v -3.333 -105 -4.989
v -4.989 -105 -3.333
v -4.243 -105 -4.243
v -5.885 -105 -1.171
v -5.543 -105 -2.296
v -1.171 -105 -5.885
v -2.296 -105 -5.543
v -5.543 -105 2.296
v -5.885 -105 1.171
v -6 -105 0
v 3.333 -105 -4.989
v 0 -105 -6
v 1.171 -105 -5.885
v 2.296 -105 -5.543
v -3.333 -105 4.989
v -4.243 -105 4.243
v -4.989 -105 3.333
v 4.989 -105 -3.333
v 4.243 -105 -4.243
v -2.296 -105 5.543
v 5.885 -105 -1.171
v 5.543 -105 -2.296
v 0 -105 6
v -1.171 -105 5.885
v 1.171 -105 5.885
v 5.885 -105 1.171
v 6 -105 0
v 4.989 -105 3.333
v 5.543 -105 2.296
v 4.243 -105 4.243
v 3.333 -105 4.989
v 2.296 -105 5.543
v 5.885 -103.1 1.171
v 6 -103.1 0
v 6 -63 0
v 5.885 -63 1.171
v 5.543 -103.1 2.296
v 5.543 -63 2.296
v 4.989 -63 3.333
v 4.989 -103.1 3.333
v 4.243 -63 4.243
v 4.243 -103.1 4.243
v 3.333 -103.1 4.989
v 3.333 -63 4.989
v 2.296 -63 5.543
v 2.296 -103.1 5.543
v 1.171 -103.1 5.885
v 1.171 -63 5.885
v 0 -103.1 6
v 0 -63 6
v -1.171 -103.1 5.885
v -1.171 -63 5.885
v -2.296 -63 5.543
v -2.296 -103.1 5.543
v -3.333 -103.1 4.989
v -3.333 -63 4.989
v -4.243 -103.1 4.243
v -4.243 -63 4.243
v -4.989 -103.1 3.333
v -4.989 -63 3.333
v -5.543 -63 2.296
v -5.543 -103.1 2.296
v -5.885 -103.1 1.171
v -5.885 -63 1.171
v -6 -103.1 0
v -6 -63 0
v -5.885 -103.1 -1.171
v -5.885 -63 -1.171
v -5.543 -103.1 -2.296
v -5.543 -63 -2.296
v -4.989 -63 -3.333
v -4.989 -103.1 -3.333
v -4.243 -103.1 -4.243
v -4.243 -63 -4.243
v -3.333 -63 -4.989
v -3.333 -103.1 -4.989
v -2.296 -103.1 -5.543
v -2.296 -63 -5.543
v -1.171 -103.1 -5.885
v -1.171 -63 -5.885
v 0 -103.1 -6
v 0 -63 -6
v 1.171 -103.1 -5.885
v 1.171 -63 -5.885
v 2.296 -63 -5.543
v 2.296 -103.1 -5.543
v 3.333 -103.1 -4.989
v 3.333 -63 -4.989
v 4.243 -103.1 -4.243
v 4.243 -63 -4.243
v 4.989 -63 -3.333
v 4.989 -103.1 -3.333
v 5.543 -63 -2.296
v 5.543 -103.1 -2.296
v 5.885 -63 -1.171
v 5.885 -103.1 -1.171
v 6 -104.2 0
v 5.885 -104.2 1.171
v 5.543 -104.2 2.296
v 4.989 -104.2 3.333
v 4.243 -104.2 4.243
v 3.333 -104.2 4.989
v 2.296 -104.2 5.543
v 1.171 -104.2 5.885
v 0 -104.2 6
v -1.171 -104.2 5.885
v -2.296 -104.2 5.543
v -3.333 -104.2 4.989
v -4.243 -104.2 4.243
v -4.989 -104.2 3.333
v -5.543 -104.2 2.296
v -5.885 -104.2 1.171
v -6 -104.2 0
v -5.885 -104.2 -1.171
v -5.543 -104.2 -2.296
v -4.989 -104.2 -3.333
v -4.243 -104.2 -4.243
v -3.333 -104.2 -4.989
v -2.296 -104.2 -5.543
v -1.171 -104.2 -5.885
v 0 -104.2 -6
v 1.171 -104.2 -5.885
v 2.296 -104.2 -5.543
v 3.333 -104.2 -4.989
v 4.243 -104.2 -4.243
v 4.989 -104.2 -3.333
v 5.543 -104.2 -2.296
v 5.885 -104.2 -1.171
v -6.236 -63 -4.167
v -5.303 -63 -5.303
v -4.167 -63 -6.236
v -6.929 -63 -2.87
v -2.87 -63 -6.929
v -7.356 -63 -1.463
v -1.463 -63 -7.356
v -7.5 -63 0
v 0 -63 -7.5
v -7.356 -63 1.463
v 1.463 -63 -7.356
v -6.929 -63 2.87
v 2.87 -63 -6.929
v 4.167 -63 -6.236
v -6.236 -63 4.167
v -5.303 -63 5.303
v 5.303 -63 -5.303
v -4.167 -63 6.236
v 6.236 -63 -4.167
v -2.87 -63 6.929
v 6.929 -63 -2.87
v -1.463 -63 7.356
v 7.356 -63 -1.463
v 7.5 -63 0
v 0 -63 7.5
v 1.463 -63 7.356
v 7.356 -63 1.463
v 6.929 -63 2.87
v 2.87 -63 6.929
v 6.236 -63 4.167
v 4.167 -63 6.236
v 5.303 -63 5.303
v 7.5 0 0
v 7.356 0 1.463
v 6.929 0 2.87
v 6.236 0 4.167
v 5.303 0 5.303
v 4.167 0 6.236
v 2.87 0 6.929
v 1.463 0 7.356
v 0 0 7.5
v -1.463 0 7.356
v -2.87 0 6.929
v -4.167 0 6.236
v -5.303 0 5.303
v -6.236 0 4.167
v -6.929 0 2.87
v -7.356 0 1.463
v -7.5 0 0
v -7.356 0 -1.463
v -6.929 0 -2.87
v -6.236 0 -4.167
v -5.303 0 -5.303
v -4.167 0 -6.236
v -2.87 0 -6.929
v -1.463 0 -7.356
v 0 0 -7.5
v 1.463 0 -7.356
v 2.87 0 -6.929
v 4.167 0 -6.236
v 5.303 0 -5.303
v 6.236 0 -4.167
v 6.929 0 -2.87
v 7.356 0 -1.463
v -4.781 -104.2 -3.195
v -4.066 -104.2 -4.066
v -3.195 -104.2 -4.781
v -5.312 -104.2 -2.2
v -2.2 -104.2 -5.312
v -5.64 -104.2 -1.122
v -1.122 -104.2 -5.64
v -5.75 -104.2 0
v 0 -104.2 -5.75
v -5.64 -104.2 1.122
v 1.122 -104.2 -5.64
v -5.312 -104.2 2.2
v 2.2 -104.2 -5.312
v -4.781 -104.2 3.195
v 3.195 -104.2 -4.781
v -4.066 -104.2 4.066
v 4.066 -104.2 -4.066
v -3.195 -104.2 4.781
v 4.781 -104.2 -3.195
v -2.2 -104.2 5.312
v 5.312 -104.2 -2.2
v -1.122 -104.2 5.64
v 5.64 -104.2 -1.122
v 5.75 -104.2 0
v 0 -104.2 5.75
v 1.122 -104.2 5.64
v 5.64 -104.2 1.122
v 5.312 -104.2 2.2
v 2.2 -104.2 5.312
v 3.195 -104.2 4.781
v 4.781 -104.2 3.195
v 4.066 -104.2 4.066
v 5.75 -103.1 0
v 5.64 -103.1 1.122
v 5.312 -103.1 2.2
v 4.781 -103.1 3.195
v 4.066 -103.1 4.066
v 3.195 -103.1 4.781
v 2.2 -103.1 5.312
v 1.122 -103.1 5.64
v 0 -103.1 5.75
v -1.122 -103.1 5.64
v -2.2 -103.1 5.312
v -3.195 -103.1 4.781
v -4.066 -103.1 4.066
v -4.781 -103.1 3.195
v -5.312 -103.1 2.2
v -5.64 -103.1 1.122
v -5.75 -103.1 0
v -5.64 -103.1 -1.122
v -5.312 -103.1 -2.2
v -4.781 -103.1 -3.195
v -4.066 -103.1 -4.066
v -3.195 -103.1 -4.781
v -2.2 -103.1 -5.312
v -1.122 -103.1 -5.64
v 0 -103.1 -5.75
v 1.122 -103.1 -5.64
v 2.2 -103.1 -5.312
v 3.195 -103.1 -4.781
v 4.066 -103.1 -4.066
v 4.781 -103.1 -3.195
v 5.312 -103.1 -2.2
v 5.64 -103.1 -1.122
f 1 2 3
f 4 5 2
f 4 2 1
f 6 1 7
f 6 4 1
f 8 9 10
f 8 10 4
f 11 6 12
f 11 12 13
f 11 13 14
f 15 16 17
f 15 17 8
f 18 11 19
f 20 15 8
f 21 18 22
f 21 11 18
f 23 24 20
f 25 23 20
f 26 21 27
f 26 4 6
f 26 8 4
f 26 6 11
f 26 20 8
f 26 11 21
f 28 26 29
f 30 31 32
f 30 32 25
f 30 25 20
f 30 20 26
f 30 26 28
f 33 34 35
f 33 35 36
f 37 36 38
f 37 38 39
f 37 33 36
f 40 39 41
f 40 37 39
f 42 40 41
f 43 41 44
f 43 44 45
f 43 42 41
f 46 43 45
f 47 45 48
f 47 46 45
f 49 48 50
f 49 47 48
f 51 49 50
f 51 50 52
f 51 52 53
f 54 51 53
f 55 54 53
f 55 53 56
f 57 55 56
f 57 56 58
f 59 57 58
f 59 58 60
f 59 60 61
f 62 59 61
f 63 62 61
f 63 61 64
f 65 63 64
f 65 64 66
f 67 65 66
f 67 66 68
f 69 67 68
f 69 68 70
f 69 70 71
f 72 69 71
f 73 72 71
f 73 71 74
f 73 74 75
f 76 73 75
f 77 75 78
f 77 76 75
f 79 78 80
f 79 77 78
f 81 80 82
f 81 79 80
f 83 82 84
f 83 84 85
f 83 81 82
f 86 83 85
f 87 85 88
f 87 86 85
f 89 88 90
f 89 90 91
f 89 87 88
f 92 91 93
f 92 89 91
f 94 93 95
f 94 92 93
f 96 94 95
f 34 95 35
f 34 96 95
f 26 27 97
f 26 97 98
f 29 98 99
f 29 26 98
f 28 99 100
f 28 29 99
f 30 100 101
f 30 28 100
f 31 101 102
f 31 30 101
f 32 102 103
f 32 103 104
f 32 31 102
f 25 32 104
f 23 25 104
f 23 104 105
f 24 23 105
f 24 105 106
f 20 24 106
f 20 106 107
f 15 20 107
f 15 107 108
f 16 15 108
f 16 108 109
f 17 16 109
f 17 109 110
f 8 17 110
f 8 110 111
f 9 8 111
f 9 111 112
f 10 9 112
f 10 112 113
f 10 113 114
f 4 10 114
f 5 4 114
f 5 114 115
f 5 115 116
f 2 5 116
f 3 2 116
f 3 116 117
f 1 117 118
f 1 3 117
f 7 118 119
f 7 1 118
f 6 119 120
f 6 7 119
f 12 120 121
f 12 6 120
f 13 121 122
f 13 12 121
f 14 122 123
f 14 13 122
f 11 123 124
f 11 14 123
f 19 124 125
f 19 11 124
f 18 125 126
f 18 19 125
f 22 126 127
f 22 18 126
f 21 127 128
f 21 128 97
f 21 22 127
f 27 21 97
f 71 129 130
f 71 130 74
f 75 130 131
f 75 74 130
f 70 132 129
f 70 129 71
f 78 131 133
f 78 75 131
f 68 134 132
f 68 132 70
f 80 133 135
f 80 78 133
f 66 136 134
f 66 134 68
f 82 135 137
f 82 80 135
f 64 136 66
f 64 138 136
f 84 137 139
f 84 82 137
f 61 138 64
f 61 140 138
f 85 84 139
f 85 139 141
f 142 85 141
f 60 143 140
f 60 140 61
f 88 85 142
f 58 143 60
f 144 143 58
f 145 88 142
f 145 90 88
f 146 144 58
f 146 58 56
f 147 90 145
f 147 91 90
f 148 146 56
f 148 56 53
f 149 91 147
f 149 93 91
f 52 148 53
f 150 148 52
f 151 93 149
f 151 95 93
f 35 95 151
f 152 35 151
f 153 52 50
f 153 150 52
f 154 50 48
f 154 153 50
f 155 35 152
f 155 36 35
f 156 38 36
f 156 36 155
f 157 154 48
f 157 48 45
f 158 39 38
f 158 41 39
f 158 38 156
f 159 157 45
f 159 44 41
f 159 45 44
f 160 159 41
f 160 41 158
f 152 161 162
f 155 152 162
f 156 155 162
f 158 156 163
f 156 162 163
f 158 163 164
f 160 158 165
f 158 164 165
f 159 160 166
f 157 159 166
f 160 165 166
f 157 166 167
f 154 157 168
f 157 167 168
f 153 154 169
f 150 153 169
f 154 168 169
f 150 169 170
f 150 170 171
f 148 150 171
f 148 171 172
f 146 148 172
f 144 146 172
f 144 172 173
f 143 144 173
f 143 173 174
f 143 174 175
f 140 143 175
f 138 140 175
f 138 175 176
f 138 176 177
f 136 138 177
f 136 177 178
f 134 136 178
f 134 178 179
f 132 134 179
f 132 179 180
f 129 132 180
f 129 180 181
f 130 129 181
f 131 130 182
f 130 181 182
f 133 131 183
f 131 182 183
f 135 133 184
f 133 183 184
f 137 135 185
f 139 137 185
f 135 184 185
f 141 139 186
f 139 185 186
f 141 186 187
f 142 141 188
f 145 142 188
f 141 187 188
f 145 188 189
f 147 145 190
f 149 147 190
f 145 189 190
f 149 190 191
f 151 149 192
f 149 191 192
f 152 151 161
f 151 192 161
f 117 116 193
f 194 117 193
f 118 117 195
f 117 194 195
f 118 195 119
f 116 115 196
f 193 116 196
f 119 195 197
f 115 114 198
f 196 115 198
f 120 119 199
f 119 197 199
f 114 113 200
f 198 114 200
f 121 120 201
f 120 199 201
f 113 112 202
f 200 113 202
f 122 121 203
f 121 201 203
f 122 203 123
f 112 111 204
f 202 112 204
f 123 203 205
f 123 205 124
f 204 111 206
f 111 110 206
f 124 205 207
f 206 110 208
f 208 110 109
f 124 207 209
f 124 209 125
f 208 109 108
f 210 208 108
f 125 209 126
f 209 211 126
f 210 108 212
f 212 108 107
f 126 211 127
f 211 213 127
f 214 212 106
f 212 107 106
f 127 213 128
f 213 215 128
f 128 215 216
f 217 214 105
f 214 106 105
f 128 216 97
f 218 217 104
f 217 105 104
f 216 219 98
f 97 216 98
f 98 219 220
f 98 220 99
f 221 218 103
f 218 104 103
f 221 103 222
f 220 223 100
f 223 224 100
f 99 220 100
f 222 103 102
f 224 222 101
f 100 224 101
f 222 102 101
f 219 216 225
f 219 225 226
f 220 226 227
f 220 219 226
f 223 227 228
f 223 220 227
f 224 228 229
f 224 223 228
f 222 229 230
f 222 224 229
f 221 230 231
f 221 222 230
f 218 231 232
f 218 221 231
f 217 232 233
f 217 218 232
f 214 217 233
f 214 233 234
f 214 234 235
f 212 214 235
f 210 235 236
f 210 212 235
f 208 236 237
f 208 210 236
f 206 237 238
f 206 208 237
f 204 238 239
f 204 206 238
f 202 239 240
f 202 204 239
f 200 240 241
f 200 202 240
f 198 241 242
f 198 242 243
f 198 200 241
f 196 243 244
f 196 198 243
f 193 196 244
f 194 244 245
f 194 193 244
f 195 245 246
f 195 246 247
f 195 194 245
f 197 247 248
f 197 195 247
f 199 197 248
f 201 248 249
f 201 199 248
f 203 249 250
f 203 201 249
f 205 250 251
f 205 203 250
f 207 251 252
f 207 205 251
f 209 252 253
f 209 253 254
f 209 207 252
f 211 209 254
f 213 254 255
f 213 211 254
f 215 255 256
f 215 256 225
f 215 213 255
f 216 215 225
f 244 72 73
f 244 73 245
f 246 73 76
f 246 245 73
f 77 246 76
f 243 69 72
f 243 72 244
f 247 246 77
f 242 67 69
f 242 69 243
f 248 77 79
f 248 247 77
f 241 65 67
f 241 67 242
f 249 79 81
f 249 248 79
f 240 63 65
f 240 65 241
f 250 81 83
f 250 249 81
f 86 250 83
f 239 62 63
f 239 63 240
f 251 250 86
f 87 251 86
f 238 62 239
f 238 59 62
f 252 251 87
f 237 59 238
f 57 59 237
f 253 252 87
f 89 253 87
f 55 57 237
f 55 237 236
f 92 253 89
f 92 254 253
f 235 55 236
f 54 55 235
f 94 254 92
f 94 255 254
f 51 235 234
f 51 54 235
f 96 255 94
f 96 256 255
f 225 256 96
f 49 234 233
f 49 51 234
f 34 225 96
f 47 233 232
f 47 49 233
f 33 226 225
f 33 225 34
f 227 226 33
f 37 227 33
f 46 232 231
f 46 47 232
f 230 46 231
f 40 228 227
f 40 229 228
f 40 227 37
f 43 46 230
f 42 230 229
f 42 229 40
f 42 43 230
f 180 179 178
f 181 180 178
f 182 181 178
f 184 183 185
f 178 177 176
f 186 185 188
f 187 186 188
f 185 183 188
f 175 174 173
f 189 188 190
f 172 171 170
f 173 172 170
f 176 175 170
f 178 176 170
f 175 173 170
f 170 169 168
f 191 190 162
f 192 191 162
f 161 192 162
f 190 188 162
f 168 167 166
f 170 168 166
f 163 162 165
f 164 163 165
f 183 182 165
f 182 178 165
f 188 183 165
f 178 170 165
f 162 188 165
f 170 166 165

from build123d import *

# Parameters (mm, degrees)
F0_R     = 7.5
F1_DEPTH = 105
F2_R     = 7.5
F2_R_2   = 6
F3_DEPTH = 42
F5_R     = 6
F5_R_2   = 5.75
F6_DEPTH = 1.1


with BuildPart() as f1:
    # F0 (on Front) → F1 (new body)
    with BuildSketch(Plane.XZ):
        Circle(F0_R)
    extrude(amount=F1_DEPTH)

    # F2 (on face) → F3 (cut)
    with BuildSketch(Plane.XZ.offset(105)):
        Circle(F2_R)
        Circle(F2_R_2, mode=Mode.SUBTRACT)
    extrude(amount=-F3_DEPTH, mode=Mode.SUBTRACT)

    # F5 (on offset) → F6 (cut)
    with BuildSketch(Plane.XZ.offset(104.2)):
        Circle(F5_R)
        Circle(F5_R_2, mode=Mode.SUBTRACT)
    extrude(amount=-F6_DEPTH, mode=Mode.SUBTRACT)


solid = f1.part
